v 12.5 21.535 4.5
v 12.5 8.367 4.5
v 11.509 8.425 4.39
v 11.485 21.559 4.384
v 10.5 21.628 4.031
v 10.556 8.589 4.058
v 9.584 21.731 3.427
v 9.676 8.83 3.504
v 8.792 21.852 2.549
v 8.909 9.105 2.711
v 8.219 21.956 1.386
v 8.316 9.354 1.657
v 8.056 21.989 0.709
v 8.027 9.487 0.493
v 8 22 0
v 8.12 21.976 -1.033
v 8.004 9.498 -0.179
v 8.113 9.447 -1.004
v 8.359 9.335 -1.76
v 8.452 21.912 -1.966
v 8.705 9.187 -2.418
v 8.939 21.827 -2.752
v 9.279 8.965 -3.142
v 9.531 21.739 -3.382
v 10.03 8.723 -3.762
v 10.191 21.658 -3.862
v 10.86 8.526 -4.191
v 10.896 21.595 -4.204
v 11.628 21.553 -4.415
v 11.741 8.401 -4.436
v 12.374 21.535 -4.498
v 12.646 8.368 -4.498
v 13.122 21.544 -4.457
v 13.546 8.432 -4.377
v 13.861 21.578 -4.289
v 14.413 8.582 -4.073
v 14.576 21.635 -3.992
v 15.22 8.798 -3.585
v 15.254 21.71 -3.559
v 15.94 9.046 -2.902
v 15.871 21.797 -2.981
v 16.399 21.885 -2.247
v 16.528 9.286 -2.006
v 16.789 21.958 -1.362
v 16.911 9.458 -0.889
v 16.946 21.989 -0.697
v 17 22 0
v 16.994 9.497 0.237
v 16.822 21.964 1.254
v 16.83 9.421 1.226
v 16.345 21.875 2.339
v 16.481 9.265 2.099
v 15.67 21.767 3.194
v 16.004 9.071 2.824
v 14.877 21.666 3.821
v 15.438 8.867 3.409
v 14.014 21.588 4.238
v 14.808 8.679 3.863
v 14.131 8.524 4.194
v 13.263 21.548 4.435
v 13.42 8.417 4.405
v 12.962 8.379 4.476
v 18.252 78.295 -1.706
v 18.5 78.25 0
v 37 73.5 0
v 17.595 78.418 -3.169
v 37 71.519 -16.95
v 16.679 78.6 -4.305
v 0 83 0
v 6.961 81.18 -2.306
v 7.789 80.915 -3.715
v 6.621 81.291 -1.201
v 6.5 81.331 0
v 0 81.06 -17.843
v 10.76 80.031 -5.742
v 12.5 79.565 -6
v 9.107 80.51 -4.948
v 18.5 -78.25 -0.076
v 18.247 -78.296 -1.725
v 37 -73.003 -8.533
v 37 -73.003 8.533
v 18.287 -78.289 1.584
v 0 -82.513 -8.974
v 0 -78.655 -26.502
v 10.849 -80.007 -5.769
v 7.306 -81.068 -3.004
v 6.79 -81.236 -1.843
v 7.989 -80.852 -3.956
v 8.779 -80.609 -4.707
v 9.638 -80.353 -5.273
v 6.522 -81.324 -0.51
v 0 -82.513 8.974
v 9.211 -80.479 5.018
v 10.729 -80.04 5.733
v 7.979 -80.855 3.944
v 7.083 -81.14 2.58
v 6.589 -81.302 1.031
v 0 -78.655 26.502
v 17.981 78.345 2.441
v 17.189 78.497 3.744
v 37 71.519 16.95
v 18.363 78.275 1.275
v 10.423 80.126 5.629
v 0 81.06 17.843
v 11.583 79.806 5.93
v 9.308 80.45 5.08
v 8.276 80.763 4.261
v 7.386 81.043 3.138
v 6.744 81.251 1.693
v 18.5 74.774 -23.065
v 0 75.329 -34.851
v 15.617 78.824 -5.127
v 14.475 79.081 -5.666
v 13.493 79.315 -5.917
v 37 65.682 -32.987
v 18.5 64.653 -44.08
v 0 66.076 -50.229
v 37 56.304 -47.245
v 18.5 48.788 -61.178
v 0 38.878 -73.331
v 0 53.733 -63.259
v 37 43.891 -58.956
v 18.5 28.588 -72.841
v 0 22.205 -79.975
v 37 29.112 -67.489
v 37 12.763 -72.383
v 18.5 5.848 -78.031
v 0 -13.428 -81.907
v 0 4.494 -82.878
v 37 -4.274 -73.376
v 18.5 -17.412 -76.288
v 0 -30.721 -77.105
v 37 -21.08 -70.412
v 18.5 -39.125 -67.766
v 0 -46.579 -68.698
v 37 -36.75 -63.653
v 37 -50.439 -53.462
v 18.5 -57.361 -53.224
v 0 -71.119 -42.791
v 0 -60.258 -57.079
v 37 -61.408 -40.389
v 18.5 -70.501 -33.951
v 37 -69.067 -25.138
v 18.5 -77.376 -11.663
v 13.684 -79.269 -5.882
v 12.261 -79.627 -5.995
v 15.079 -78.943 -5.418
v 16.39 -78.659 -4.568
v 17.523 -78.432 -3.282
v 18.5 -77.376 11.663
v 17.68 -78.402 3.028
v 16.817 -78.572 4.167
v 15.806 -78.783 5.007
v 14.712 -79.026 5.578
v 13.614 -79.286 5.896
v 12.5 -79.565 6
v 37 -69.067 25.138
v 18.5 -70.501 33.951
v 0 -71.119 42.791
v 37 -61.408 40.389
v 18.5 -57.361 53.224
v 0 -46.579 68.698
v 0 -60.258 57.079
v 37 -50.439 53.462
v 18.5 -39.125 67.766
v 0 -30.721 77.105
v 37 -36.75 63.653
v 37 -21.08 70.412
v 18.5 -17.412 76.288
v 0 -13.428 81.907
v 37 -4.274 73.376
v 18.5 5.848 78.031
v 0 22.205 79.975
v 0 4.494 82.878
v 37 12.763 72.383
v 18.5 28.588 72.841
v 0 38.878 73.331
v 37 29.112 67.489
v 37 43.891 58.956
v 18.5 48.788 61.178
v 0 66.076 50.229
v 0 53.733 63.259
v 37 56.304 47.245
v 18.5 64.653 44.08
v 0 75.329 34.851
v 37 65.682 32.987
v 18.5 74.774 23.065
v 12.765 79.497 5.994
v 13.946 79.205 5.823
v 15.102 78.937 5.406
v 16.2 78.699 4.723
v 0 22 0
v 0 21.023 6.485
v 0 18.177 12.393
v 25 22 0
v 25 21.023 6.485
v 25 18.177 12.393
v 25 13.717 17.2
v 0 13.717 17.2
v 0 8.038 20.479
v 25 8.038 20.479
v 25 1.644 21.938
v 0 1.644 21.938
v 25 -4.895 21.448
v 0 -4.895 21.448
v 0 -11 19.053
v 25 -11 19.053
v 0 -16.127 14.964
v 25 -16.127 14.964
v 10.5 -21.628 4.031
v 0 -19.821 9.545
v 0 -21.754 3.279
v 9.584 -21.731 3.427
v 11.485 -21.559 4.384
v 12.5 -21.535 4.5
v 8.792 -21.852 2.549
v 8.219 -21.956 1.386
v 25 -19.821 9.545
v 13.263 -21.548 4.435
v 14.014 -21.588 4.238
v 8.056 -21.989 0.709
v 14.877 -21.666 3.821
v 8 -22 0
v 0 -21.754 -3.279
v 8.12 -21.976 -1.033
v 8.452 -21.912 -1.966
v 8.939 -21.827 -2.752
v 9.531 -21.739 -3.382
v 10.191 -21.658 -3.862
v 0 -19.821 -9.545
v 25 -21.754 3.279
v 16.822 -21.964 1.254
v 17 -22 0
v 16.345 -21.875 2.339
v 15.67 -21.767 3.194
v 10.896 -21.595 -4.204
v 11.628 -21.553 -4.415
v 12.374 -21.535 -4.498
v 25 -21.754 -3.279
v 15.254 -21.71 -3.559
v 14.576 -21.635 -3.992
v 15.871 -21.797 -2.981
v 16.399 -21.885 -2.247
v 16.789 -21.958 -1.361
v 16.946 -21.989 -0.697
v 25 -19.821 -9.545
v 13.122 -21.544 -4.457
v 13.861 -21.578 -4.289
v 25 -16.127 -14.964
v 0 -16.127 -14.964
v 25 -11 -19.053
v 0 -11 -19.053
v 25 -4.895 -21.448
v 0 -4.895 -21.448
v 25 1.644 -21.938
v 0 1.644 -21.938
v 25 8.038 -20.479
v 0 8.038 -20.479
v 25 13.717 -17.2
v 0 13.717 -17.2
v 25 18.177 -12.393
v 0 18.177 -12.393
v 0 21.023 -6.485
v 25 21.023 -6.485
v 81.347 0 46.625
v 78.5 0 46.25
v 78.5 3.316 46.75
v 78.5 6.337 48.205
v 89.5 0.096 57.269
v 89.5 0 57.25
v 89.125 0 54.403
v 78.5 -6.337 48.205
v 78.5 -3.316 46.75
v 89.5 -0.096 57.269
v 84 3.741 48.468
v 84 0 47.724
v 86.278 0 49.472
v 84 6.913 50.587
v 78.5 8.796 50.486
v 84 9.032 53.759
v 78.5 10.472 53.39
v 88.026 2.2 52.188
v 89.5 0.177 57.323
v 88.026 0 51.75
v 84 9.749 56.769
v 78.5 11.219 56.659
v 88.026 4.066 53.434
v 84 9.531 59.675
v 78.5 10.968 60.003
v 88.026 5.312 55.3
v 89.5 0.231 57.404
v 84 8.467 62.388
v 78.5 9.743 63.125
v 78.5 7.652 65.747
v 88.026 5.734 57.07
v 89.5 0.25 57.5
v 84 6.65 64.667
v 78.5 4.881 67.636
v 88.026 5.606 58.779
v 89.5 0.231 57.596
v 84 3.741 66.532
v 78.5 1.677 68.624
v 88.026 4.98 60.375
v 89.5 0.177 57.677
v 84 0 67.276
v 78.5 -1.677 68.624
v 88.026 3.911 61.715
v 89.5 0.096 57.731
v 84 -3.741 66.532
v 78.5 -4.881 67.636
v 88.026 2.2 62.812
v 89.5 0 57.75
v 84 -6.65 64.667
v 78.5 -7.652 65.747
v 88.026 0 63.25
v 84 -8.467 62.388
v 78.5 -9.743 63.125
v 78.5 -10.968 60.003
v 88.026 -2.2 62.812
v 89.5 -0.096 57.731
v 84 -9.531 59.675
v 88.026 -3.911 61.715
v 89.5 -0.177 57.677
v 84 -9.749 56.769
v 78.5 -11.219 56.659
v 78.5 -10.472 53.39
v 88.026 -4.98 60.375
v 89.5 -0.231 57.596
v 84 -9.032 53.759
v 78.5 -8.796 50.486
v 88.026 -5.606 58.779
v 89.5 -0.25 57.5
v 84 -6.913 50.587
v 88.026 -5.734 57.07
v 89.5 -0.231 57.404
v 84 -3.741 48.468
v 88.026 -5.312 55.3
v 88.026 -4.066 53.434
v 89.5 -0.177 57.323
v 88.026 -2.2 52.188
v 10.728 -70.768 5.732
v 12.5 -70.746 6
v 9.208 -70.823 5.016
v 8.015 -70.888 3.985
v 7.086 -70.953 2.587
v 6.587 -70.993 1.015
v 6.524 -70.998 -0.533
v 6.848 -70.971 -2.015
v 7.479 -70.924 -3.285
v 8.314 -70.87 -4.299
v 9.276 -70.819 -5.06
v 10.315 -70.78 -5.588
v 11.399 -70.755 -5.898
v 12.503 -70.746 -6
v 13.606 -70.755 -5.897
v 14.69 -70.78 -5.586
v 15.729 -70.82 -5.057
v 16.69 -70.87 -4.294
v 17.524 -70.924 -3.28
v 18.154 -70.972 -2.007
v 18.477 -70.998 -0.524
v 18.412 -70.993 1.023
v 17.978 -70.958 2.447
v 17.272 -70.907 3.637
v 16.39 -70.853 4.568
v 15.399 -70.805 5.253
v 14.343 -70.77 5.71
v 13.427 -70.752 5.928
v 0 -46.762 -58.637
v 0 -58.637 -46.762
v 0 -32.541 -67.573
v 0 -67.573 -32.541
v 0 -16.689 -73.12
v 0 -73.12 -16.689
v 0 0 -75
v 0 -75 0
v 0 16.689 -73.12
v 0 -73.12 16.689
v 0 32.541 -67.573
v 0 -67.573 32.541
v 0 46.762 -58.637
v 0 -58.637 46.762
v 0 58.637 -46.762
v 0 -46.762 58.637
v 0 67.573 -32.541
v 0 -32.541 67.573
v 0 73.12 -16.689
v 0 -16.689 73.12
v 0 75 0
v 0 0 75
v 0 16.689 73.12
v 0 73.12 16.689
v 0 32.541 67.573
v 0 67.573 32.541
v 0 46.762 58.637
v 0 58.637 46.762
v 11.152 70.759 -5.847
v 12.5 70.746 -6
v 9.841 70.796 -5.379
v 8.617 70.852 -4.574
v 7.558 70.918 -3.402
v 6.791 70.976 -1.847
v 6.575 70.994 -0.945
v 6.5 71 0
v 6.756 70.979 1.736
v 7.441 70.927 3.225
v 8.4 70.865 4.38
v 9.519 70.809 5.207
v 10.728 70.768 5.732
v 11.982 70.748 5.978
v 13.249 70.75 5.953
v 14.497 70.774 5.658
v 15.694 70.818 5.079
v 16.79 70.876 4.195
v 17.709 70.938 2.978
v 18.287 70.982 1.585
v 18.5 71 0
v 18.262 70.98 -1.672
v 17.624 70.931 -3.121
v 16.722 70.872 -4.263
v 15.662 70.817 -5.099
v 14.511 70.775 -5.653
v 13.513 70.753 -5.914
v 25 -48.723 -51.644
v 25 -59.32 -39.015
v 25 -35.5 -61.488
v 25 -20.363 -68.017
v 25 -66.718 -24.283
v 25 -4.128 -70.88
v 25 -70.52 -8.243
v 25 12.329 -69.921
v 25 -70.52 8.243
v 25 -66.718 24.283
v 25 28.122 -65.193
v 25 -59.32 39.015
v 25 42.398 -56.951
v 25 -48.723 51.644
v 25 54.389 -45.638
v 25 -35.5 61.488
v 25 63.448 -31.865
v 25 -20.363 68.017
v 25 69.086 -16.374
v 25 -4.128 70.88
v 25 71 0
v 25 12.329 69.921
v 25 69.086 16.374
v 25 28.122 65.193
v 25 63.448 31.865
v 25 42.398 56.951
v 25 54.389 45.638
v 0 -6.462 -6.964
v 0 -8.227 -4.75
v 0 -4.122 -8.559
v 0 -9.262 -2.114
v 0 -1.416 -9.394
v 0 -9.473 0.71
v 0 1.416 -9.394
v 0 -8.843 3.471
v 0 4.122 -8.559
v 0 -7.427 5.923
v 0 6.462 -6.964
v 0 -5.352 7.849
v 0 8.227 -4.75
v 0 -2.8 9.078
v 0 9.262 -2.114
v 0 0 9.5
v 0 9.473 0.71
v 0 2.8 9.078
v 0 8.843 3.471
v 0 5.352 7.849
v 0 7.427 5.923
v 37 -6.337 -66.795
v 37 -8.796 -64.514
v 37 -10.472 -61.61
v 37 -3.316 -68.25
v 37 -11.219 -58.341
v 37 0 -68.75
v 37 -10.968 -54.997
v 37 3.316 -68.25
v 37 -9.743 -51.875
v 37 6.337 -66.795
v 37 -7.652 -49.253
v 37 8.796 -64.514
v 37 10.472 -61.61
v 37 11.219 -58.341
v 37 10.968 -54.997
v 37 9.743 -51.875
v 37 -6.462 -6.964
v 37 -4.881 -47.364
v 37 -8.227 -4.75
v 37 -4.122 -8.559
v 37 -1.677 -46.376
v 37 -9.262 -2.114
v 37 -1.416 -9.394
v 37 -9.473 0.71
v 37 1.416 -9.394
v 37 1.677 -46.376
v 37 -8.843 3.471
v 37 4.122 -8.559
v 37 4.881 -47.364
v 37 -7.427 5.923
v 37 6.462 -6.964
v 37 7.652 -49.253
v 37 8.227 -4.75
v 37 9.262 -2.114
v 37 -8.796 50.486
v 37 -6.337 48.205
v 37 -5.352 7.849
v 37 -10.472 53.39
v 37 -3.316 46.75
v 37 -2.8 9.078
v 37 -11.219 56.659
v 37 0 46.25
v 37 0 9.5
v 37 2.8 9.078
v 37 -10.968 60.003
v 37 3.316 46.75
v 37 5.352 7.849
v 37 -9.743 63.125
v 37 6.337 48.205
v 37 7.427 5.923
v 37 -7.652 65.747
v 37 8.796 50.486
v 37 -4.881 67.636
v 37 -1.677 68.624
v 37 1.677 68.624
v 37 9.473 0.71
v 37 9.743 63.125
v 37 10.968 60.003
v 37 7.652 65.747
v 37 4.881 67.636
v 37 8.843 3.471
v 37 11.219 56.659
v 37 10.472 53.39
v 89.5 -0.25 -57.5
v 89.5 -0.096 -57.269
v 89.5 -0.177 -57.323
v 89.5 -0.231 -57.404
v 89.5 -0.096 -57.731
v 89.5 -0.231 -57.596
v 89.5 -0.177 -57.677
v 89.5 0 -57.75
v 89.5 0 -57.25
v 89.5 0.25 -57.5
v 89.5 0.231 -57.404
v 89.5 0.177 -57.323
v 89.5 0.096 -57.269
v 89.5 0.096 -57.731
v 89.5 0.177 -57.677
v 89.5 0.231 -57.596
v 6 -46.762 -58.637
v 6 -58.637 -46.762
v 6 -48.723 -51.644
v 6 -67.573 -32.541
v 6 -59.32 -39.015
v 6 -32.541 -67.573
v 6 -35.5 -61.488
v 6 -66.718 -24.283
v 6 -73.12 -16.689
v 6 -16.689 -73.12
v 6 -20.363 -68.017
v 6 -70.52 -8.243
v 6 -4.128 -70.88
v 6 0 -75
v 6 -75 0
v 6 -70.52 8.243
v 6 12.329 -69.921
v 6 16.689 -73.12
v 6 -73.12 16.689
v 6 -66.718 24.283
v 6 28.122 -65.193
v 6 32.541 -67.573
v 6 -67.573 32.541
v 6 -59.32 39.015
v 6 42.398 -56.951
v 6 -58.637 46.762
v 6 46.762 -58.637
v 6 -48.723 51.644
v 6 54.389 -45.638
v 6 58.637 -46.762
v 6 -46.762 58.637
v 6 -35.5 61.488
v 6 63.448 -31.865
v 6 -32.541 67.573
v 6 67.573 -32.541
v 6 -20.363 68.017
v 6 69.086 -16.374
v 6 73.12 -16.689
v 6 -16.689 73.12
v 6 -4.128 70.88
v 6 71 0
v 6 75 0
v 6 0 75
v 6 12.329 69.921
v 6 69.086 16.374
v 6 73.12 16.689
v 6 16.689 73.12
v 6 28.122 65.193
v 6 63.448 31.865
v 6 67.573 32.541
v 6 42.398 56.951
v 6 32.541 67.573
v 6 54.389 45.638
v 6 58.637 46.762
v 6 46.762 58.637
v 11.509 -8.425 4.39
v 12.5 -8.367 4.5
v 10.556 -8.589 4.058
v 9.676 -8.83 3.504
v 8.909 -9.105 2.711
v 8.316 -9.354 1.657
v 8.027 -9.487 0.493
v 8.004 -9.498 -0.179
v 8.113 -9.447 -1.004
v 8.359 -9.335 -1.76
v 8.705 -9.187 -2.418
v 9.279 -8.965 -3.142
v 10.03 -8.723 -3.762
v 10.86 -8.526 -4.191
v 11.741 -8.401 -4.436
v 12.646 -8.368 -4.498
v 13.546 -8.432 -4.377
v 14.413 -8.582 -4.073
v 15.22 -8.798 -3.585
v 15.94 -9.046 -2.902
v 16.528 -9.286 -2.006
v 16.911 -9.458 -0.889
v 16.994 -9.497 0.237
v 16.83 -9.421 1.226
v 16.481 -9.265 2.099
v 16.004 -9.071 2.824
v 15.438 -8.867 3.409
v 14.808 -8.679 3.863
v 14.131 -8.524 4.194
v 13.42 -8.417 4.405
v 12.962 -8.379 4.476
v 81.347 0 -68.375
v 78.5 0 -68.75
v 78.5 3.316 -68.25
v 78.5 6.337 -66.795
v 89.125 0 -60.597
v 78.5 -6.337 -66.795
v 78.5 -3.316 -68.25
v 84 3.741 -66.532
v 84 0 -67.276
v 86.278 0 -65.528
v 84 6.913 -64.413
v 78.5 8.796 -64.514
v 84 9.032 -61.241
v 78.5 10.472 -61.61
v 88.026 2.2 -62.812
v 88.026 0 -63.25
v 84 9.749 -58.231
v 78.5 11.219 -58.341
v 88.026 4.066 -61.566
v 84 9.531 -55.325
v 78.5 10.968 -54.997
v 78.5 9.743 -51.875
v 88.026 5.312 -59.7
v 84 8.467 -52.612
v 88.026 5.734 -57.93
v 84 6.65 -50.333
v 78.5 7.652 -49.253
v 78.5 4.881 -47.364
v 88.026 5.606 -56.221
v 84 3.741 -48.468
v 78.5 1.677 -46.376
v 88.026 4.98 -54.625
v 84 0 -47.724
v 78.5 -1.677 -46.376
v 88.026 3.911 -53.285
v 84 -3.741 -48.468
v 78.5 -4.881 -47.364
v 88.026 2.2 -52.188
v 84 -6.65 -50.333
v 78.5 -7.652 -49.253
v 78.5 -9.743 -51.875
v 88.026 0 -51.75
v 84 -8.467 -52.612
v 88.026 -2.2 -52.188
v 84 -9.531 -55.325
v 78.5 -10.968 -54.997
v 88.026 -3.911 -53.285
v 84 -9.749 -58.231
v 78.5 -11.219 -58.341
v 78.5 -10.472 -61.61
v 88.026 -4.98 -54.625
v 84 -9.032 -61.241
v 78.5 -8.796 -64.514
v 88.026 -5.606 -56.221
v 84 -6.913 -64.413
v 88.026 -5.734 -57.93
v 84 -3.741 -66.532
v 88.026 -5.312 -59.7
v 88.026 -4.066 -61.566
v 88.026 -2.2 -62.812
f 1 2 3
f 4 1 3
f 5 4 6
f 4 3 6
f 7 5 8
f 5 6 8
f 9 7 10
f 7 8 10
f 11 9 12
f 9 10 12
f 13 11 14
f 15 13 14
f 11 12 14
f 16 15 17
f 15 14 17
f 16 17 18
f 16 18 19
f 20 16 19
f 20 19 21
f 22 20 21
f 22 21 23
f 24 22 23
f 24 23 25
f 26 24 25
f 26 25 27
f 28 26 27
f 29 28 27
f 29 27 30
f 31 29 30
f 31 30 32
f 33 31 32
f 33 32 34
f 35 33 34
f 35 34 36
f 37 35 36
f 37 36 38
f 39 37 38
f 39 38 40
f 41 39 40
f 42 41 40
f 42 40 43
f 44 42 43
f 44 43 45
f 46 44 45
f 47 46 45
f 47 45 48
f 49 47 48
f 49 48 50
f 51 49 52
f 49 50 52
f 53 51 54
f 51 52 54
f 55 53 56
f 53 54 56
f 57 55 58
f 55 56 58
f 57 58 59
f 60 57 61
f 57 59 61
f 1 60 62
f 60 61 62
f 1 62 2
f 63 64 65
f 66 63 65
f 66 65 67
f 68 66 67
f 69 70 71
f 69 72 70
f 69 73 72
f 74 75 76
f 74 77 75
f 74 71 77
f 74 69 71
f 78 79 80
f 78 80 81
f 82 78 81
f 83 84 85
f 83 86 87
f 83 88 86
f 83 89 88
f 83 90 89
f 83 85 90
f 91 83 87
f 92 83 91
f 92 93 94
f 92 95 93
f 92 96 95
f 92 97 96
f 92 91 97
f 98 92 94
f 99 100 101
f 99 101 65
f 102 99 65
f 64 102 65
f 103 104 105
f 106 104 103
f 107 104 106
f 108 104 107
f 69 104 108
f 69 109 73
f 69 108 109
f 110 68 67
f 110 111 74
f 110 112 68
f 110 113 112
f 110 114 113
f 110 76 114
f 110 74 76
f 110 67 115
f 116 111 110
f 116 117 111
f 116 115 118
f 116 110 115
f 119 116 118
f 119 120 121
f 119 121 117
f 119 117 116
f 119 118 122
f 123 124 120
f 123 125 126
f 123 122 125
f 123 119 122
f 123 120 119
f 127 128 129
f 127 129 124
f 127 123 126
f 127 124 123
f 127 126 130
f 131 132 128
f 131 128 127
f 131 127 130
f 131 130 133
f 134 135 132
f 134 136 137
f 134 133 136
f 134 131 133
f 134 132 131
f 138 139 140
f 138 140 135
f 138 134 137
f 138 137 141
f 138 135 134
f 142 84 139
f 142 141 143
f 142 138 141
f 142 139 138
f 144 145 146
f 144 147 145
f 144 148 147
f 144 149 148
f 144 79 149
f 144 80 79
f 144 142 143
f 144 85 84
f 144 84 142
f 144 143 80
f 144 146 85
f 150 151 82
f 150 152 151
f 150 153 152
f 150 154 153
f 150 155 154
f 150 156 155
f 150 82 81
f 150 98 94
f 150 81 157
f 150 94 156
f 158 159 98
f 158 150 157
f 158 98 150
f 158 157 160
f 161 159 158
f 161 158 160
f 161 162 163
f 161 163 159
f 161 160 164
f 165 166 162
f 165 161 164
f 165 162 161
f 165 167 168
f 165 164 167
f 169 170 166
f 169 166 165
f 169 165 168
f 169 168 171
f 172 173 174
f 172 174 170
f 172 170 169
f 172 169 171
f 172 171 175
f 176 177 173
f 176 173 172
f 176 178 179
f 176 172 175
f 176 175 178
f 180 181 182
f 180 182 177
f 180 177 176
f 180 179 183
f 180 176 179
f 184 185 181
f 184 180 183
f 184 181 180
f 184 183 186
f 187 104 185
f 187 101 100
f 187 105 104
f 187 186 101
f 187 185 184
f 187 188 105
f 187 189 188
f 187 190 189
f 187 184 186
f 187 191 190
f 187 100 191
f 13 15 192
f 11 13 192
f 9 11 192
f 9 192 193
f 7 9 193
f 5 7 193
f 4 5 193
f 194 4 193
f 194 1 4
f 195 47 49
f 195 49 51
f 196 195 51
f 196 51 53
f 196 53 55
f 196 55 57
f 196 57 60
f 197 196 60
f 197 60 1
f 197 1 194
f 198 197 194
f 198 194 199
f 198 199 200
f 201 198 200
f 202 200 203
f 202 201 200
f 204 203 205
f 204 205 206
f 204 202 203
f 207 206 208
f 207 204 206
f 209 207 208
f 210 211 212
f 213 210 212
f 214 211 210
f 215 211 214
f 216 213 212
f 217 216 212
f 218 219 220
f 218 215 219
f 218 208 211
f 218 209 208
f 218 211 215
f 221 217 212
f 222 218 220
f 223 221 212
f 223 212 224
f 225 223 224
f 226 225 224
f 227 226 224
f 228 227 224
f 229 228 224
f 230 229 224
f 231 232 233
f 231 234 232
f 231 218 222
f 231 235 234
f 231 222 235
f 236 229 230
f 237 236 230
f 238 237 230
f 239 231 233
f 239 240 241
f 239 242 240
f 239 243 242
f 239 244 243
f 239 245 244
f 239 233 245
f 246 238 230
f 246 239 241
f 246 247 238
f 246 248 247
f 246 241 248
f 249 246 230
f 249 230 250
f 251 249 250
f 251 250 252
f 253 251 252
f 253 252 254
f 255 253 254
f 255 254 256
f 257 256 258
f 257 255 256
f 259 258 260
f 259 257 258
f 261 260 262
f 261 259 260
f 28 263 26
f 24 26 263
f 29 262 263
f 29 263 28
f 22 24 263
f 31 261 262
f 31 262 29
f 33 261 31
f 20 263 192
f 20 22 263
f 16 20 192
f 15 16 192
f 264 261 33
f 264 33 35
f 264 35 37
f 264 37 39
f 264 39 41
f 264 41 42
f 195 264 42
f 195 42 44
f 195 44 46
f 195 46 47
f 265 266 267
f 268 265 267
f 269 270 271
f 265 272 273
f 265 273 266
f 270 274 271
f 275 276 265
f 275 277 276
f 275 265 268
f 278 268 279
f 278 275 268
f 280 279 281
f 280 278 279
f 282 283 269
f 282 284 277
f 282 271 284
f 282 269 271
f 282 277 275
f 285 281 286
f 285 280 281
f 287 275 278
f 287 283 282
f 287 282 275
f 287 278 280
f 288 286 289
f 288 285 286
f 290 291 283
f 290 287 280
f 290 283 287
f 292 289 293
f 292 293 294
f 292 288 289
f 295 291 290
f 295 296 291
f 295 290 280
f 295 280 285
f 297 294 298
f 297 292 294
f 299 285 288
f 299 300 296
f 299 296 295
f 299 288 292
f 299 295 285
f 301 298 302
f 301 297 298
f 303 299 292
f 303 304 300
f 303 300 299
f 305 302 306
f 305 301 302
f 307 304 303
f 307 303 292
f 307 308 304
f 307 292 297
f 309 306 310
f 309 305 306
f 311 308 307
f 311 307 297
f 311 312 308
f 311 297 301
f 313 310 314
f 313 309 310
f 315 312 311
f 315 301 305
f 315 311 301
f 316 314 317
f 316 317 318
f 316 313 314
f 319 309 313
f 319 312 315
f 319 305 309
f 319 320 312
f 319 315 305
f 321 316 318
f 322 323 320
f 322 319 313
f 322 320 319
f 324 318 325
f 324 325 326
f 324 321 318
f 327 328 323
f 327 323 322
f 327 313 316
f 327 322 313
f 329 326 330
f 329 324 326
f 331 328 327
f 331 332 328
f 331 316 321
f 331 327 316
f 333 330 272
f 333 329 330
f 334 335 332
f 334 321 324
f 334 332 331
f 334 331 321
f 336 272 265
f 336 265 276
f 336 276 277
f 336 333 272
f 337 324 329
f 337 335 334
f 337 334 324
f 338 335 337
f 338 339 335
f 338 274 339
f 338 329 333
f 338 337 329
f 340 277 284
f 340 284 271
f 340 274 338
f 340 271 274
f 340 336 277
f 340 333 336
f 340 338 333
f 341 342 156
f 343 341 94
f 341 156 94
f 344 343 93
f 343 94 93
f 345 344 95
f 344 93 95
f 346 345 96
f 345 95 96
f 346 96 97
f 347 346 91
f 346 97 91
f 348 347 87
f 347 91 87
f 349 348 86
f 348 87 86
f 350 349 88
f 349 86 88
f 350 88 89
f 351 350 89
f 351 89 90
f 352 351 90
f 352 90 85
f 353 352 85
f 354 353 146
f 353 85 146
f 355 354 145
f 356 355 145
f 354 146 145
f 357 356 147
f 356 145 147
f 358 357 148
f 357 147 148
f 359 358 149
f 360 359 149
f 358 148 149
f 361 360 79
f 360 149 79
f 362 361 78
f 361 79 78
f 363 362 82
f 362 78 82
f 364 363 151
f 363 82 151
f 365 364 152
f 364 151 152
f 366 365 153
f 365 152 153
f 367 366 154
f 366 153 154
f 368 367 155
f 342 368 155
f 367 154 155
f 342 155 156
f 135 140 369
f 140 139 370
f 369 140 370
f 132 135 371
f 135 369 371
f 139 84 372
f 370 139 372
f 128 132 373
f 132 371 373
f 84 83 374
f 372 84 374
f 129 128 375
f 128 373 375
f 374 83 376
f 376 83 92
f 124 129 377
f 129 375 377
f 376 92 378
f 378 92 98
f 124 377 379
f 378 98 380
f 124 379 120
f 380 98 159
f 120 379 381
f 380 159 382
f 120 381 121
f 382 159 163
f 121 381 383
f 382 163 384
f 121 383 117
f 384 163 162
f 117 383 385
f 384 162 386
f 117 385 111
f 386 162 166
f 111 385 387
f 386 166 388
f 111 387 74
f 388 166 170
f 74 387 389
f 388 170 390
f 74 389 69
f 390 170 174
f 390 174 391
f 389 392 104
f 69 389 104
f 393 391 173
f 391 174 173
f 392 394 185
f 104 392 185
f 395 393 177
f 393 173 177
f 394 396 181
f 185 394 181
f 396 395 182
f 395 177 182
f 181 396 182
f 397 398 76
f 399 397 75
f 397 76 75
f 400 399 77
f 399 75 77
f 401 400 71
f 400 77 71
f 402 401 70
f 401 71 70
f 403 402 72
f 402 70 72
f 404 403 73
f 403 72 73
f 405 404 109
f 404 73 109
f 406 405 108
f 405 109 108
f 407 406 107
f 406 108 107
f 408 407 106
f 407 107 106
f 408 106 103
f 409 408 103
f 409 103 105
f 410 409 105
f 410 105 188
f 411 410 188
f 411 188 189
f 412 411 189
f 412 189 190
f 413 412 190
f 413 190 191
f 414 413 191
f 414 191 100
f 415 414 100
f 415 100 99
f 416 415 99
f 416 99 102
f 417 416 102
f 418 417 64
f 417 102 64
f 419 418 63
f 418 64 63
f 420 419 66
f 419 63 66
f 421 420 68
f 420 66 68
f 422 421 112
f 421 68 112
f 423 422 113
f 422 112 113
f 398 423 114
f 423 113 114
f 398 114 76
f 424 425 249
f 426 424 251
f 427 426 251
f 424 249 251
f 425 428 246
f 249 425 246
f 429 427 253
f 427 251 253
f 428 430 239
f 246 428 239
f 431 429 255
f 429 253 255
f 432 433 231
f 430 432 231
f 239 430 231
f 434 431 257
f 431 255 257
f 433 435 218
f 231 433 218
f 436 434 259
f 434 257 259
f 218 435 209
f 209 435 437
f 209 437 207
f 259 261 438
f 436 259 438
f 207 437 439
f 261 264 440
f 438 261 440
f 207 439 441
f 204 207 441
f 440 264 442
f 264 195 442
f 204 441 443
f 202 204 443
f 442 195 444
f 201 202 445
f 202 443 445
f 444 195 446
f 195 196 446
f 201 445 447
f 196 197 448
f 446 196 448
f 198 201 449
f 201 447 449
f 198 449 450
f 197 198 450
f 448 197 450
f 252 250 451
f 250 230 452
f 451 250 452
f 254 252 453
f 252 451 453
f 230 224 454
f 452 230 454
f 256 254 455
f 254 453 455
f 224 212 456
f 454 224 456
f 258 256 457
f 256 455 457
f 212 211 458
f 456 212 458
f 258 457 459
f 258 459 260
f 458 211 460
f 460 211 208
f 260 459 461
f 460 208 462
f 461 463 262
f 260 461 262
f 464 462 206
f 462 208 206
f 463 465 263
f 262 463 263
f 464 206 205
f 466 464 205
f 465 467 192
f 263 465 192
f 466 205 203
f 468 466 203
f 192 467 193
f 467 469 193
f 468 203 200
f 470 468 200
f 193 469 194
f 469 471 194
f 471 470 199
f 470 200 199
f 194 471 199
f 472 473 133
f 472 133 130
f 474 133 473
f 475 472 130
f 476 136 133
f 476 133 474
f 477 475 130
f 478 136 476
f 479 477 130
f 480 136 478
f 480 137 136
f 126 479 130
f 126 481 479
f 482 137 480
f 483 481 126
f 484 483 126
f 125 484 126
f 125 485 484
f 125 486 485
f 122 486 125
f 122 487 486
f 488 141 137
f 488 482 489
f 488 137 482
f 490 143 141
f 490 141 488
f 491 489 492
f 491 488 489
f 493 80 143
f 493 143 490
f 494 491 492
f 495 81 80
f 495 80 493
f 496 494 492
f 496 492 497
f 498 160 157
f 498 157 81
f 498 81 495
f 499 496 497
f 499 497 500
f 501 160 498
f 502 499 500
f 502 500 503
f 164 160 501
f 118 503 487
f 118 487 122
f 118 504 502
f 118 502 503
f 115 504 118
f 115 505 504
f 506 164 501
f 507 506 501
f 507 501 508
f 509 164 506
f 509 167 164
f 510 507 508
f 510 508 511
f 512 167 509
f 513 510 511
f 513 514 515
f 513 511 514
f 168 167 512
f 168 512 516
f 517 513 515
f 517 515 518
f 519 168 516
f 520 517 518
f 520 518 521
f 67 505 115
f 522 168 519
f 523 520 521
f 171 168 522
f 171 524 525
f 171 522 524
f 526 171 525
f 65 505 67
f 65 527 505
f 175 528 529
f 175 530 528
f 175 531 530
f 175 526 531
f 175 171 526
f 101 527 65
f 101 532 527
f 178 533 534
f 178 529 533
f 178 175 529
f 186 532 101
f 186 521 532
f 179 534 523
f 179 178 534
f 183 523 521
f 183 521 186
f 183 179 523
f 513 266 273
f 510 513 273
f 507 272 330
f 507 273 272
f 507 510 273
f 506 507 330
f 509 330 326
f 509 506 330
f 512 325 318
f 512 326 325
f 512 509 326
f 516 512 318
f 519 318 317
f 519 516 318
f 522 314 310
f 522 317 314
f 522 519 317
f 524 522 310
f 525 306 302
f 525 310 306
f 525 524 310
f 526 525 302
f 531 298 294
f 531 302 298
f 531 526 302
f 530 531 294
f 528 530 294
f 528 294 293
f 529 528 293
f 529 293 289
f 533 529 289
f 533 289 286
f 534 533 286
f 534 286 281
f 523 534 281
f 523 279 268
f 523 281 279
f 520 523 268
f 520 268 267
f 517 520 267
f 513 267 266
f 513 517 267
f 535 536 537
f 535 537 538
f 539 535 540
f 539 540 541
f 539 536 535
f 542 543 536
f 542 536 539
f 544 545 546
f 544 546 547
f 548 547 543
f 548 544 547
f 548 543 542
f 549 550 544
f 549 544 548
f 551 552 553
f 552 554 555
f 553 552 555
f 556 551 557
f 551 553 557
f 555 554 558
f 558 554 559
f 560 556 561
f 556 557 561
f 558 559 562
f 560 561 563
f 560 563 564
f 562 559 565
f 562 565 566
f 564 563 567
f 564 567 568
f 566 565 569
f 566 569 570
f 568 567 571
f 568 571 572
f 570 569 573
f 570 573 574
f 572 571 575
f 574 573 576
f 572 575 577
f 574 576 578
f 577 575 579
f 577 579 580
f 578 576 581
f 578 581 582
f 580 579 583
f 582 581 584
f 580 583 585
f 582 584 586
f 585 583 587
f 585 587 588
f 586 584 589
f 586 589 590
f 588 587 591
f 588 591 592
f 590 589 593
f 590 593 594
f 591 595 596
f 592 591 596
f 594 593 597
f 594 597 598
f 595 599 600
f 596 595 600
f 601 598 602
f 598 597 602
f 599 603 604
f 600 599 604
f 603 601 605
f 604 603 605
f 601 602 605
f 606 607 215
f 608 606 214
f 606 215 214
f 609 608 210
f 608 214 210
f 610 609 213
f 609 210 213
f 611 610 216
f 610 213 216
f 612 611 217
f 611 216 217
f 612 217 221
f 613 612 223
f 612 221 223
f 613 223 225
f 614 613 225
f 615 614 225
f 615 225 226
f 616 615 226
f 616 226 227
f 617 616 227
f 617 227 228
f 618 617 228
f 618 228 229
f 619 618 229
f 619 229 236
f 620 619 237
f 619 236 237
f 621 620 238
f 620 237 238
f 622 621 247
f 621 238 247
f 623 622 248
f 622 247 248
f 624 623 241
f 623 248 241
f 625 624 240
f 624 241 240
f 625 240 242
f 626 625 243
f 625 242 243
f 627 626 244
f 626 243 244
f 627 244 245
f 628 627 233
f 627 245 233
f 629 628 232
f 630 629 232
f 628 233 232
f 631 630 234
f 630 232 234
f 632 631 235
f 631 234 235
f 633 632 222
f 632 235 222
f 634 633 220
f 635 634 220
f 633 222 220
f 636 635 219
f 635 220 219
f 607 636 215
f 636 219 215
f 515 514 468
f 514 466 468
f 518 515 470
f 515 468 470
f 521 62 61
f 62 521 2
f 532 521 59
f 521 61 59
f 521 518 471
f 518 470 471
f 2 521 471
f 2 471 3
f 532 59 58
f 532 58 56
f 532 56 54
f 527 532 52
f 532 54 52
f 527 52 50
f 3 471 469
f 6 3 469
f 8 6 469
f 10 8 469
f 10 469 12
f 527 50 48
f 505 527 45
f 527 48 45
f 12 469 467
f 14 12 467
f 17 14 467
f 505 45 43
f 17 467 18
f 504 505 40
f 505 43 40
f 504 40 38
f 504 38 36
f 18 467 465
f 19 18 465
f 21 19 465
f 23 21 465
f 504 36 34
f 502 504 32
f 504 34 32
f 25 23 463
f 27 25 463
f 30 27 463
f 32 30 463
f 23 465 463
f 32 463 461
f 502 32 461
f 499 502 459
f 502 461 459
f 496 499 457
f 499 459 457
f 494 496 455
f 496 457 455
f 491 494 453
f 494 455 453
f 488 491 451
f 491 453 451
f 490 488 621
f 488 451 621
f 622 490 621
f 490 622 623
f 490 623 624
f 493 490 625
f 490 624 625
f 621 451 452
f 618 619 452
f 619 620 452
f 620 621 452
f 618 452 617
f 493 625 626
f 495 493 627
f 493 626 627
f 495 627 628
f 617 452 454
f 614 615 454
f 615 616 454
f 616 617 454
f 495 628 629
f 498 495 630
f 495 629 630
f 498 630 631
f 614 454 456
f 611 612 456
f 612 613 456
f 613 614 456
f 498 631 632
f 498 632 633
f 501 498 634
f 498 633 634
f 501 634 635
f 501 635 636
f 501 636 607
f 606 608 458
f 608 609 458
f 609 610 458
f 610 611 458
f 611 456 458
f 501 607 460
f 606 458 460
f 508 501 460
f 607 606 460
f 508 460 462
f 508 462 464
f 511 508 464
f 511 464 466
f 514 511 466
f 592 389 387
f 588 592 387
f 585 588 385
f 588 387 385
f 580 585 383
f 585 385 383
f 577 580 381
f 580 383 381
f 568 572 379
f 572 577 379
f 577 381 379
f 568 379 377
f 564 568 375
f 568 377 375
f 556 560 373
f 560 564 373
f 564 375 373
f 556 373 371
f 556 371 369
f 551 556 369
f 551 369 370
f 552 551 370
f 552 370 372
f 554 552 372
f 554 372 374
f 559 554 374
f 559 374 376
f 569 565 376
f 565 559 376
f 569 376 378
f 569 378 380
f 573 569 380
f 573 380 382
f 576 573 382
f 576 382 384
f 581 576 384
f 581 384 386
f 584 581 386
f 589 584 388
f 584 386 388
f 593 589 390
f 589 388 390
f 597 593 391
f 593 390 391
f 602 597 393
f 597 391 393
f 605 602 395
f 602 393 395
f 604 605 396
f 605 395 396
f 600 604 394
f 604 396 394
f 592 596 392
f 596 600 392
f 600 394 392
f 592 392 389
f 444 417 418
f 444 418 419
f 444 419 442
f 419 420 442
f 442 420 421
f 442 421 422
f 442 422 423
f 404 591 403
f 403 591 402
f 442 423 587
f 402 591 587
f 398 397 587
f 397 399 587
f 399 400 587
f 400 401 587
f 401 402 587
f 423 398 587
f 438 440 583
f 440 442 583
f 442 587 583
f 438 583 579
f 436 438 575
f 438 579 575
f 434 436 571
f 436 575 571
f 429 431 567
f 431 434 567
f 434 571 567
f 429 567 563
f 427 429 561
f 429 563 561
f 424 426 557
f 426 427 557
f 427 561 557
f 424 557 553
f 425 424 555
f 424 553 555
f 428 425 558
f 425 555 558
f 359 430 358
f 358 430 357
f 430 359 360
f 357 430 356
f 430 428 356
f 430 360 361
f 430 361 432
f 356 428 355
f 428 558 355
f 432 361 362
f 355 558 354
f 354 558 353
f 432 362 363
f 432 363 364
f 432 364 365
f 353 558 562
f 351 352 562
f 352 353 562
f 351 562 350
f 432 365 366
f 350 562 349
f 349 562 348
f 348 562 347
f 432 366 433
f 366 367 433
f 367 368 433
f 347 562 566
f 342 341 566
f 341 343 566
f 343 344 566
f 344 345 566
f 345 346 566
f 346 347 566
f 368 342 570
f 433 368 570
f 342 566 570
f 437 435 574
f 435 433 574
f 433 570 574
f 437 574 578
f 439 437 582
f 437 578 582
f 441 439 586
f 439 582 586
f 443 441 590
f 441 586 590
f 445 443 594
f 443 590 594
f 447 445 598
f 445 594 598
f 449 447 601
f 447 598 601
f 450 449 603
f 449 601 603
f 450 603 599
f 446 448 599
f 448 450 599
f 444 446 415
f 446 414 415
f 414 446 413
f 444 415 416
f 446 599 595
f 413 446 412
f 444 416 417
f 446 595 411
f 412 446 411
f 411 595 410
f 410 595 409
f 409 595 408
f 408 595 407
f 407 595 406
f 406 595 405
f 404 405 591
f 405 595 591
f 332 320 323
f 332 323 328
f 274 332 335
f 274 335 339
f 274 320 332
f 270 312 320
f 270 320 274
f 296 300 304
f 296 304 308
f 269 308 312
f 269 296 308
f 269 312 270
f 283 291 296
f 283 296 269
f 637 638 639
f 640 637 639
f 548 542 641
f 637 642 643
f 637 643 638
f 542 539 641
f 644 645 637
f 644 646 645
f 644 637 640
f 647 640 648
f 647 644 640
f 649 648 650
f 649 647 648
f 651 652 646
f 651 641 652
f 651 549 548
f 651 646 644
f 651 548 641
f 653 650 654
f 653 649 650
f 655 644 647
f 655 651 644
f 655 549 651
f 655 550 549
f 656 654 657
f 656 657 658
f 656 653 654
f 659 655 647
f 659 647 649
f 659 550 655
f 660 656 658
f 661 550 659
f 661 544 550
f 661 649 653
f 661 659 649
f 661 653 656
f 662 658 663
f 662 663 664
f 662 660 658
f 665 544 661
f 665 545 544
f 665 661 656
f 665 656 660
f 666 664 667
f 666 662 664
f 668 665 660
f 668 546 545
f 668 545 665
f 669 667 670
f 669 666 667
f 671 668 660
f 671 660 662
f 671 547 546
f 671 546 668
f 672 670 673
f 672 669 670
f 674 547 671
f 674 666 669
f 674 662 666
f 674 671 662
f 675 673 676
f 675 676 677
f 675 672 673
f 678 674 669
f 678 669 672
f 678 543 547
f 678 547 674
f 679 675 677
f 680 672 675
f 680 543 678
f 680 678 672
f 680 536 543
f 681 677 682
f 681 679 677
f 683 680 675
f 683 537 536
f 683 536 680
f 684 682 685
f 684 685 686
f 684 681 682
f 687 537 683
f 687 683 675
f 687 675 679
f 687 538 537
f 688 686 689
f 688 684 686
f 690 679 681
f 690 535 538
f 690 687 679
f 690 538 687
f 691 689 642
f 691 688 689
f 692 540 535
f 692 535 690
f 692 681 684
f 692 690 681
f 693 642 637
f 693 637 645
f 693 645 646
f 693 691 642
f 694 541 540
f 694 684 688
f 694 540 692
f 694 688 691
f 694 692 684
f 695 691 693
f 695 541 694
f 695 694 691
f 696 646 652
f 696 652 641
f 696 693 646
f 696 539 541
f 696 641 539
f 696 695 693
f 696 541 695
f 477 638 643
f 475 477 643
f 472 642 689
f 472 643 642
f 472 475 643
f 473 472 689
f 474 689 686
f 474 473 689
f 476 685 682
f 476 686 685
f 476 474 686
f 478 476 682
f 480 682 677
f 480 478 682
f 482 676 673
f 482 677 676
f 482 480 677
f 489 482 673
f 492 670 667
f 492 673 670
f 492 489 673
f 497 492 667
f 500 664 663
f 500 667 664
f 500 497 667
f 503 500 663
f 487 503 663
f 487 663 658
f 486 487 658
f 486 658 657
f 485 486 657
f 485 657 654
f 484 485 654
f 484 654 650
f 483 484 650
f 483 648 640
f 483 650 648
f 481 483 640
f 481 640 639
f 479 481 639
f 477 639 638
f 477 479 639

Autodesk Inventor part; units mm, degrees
ref_plane "YZ Plane" through (0, 0, 0) normal (1, 0, 0) x (0, 1, 0)
sketch "Sketch1" plane through (0, 0, 0) normal (0, 0, 1) x (1, 0, 0)
  line L0 (0, 0) -> (0, 22)
  line L1 (0, 22) -> (25, 22)
  line L2 (25, 22) -> (25, 71)
  line L3 (25, 71) -> (6, 71)
  line L4 (6, 71) -> (6, 75)
  line L5 (6, 75) -> (0, 75)
  line L6 (37, 0) -> (37, 73.5)
  line L7 (0, 75) -> (0, 83)
  line L8 (0, 83) -> (37, 73.5)
  line L9 (0, 0) -> (37, 0)
  dimension "d0" = 22
  dimension "d1" = 25
  dimension "d2" = 49
  dimension "d3" = 19
  dimension "d4" = 4
  dimension "d6" = 37
  dimension "d7" = 73.5
  dimension "d8" = 8
  dimension "d9" = 104.4
revolve "Revolution1" add sketch "Sketch1" angle 360 about axis through (0, 0, 0) along (1, 0, 0)
sketch "Sketch2" plane through (0, 0, 0) normal (-1, 0, 0) x (0, 0, 1)
  circle A0 centre (0, 0) radius 9.5
  dimension "d11" = 19
extrude "Extrusion1" cut sketch "Sketch2" against normal blind 37
sketch "Sketch3" plane through (37, 0, 0) normal (1, 0, 0) x (0, 0, -1)
  point P0 (0, 0)
sketch "Sketch4" plane through (25, 0, 0) normal (-1, 0, 0) x (0, 0, 1)
  point P0 (0, 0)
ref_plane "Work Plane1" through (12.5, 22, 0) normal (0, 1, 0) x (-1, 0, 0)
sketch "Sketch5" plane through (12.5, 22, 0) normal (0, 1, 0) x (-1, 0, 0)
  point P0 (12.5, 0)
  point P1 (0, 0)
  point P2 (0, 0)
  point P3 (0, 0)
sketch "Sketch6" plane through (37, 0, 0) normal (1, 0, 0) x (0, 0, -1)
  circle A0 centre (-57.5, 0) radius 11.25
  circle A1 centre (57.5, 0) radius 11.25
  point P0 (0, 0)
  dimension "d15" = 22.5
  dimension "d16" = 22.5
extrude "Extrusion2" add sketch "Sketch6" along normal blind 52.5
fillet "Fillet1" radius 11 2 edges at (89.5, 0, 68.75) (89.5, 0, -46.25)
hole "Hole1" at (12.5, 22, 0) direction (0, -1, 0) diameter 9 depth 45 tip angle 118
sketch "Sketch7" plane through (12.5, 22, 0) normal (0, 1, 0) x (-1, 0, 0)
  point P0 (12.5, 0)
  point P1 (0, 0)
  point P2 (0, 0)
hole "Hole2" at (12.5, 22, 0) direction (0, 1, 0) diameter 12 end through all
ref_plane "Work Plane2" through (12.5, -22, 0) normal (0, 1, 0) x (-1, 0, 0)
sketch "Sketch8" plane through (12.5, -22, 0) normal (0, 1, 0) x (-1, 0, 0)
  point P0 (12.5, 0)
  point P1 (0, 0)
  point P2 (0, 0)
hole "Hole3" at (12.5, -22, 0) direction (0, -1, 0) diameter 12 end through all
properties part number "volante final"
